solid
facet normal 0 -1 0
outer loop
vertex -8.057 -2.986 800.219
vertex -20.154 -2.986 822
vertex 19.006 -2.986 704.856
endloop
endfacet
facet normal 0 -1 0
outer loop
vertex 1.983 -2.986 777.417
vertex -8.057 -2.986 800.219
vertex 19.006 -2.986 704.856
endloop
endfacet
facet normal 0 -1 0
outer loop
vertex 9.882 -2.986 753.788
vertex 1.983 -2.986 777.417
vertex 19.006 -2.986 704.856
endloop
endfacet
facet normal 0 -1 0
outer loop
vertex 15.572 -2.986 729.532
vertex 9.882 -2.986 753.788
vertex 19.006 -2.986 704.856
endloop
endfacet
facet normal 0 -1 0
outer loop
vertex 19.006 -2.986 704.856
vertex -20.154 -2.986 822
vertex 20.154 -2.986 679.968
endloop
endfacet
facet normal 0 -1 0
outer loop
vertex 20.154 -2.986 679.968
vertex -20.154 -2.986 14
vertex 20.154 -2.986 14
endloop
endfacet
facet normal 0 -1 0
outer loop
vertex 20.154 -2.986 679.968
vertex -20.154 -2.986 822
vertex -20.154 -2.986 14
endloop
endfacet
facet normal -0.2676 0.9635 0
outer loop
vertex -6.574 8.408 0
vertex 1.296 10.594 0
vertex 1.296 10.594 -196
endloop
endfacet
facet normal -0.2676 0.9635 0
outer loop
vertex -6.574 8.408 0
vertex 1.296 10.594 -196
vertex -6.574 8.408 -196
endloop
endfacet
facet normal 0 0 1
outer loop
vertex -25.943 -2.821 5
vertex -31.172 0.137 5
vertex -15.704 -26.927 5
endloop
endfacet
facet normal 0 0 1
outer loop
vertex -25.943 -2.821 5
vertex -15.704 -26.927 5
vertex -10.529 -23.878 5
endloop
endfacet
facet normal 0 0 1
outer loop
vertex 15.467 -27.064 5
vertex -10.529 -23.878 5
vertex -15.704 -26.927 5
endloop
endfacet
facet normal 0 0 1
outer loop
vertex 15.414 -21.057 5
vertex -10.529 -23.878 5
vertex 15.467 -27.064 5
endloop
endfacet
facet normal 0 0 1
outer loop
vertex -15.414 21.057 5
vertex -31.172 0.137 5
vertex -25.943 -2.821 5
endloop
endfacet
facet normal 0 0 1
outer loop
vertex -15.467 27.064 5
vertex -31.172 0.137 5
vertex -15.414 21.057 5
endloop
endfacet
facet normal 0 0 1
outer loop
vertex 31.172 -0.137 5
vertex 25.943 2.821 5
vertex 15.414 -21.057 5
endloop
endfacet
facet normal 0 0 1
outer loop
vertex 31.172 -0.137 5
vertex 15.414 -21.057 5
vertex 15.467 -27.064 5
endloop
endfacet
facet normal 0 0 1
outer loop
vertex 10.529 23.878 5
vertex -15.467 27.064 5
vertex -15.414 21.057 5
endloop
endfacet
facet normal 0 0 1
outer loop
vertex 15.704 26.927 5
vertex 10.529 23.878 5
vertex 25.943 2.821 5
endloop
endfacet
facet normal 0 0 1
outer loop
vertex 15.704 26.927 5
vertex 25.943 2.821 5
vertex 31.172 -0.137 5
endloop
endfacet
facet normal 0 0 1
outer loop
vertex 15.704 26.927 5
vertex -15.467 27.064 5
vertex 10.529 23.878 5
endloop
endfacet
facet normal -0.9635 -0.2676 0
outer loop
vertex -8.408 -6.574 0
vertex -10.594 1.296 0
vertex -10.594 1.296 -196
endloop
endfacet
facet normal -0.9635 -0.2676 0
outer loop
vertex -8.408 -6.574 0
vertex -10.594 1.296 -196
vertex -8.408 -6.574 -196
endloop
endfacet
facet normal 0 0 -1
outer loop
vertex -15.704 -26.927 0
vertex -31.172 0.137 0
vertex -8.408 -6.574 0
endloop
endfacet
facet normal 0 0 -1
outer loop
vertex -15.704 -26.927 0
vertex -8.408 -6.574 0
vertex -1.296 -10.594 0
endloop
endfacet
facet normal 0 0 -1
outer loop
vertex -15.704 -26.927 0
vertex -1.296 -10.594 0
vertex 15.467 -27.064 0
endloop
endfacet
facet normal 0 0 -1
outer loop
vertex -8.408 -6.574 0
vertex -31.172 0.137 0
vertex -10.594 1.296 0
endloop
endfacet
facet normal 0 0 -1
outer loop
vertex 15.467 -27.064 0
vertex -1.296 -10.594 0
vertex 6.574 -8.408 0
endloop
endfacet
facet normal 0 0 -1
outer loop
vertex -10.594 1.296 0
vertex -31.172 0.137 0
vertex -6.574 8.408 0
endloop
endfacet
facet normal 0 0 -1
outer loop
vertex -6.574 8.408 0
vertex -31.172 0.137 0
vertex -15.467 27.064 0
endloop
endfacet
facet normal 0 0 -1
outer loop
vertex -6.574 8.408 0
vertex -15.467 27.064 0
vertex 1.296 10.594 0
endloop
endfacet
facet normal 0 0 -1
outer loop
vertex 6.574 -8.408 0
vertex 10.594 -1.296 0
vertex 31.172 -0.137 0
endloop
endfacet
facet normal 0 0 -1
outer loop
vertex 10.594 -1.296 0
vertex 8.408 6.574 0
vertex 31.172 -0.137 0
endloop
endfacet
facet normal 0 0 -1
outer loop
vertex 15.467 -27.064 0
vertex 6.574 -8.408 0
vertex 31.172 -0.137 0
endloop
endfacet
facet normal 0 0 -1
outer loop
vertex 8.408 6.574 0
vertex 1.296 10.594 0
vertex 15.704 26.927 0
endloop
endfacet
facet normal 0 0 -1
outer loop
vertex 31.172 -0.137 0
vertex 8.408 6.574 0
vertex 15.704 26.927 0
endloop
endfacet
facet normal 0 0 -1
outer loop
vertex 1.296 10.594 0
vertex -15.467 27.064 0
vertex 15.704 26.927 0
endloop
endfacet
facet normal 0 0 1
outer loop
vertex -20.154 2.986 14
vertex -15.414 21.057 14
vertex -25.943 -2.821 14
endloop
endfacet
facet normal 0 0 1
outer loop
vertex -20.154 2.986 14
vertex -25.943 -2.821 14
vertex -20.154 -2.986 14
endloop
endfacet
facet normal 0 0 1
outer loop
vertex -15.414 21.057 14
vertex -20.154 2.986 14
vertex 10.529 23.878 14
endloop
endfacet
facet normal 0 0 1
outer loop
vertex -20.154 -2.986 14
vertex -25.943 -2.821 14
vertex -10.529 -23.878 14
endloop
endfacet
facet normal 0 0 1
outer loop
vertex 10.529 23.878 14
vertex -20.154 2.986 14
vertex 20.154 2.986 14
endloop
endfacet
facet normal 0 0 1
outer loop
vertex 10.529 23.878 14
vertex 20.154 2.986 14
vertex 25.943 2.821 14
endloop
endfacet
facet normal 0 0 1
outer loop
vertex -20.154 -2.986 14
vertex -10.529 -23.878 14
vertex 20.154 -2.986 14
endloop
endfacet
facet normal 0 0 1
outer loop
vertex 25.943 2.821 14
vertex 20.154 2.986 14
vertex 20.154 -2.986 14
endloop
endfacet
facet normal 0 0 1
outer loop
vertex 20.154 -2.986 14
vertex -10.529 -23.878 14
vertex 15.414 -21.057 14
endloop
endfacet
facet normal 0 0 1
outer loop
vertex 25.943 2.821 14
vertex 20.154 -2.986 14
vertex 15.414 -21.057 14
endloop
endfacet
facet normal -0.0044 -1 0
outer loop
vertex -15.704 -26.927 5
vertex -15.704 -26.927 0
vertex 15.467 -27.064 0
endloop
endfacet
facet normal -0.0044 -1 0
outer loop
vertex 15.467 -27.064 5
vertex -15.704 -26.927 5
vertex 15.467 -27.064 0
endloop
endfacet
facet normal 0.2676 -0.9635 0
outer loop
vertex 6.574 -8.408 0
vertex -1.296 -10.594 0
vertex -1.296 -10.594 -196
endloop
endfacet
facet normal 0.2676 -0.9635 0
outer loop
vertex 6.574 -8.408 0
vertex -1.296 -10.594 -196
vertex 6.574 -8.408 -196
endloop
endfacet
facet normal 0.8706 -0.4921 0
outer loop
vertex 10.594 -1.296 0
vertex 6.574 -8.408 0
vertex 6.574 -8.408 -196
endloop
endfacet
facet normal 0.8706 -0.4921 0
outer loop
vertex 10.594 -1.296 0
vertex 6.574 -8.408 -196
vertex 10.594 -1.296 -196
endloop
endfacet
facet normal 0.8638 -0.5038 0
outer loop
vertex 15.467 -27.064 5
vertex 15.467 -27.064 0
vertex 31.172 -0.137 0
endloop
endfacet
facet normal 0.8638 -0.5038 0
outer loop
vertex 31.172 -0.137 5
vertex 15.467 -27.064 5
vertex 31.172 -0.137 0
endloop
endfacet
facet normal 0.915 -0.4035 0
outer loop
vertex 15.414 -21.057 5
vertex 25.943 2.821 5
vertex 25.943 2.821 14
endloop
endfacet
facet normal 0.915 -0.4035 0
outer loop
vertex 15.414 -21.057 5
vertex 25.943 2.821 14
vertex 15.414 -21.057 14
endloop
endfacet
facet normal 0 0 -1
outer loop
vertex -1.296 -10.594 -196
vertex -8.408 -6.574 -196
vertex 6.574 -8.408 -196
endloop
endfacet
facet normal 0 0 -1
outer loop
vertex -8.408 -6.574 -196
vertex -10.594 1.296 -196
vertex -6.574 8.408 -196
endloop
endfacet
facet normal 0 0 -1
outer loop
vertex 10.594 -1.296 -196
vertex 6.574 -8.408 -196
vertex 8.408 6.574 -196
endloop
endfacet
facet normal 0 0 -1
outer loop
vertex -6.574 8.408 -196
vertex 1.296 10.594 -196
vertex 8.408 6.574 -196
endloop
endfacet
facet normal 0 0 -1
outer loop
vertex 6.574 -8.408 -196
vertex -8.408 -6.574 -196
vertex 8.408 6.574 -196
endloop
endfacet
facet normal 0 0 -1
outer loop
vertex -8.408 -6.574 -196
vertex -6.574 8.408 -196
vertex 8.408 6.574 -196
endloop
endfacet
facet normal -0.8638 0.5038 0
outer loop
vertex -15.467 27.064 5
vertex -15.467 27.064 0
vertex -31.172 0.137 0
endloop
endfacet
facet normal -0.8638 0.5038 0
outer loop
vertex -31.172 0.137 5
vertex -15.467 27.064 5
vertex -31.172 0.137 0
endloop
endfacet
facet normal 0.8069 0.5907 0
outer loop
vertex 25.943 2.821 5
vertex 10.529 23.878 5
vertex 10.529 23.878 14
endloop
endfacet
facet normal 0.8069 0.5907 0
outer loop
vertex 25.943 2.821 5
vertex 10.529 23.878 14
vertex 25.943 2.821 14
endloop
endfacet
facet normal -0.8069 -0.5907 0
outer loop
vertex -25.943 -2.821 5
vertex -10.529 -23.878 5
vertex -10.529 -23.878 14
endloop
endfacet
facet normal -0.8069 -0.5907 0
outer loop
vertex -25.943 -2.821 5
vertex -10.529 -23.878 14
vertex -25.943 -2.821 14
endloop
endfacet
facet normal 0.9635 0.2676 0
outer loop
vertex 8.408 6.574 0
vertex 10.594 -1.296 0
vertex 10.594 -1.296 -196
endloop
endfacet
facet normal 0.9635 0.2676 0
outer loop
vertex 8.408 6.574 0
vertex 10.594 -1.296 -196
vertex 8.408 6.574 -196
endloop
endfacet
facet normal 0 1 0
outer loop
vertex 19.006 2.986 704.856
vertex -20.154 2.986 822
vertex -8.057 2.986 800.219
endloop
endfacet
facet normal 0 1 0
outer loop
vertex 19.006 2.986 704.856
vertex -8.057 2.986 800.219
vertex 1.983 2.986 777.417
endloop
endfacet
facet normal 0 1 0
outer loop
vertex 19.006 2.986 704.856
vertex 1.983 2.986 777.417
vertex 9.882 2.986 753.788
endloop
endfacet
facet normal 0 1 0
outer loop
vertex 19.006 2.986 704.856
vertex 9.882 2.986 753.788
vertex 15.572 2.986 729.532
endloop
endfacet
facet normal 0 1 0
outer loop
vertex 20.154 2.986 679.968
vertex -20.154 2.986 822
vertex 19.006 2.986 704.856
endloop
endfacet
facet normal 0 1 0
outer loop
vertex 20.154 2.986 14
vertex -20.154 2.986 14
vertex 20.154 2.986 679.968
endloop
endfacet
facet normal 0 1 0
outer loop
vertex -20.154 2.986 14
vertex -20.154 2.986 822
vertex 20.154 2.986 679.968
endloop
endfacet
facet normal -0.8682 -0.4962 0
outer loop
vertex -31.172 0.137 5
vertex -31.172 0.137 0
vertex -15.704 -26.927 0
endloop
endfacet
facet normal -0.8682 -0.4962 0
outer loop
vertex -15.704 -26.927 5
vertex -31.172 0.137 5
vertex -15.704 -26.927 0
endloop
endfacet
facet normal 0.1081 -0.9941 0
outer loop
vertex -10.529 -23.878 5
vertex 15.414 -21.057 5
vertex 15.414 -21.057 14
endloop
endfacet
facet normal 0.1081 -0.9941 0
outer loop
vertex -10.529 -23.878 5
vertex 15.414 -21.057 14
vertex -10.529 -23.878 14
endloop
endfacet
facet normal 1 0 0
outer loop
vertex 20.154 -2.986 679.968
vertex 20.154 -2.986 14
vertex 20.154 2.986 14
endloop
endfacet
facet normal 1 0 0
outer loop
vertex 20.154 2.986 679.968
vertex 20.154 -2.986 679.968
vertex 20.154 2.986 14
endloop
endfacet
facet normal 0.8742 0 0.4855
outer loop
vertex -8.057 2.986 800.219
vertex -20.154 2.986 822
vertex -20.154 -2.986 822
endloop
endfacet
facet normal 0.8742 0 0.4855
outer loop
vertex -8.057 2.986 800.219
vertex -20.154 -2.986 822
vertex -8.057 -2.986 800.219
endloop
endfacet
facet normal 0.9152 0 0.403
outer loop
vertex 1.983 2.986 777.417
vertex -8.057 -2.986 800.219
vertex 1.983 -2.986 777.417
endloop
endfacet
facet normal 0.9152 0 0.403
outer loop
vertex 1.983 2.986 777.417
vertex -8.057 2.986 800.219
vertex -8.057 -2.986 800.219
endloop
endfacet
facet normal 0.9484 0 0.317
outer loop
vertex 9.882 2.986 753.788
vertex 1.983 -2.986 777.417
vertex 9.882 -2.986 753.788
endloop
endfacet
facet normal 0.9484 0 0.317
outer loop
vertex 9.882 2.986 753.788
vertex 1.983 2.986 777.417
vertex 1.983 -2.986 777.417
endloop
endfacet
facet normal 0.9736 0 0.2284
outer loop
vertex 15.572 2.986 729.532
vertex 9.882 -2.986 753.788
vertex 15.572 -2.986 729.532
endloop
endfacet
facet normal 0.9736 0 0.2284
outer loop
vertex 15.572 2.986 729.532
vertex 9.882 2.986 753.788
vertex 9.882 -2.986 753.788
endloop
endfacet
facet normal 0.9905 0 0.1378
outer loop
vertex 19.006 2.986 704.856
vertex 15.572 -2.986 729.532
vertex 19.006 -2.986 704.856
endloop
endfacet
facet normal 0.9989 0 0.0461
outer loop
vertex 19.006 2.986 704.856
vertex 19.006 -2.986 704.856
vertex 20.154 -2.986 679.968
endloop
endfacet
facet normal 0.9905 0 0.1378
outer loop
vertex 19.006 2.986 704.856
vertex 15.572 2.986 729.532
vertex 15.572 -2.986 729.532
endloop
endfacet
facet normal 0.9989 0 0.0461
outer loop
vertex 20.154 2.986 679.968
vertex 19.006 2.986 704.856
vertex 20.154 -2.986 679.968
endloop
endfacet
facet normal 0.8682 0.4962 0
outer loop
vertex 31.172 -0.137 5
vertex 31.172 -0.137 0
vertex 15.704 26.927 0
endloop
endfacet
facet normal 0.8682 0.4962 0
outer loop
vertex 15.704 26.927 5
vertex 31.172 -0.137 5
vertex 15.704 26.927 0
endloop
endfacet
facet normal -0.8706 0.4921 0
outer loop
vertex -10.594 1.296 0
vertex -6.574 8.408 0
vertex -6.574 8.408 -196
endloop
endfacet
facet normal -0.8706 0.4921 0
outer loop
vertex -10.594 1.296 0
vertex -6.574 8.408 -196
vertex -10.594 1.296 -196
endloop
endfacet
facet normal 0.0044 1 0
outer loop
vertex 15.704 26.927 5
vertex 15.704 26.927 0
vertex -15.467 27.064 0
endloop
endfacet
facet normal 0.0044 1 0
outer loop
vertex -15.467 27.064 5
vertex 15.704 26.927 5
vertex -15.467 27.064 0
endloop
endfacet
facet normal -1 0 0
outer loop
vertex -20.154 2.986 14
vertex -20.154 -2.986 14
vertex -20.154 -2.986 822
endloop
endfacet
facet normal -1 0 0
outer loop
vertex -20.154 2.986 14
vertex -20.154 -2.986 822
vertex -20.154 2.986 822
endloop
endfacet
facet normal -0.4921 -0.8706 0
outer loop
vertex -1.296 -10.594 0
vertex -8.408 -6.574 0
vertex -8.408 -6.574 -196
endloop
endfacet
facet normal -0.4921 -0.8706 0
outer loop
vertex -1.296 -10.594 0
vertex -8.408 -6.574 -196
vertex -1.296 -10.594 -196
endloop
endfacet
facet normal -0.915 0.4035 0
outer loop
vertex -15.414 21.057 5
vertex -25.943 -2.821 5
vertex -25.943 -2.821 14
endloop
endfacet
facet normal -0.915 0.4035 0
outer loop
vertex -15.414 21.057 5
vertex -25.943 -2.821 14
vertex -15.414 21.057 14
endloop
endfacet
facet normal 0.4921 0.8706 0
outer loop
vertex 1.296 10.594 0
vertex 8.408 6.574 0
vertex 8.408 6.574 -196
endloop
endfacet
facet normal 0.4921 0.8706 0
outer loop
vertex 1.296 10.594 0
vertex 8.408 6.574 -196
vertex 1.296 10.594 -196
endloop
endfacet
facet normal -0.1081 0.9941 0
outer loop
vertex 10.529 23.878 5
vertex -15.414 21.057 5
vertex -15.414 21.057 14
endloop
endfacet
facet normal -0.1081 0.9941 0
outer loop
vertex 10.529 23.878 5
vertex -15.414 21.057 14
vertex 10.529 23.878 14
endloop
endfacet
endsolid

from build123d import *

# Parameters (mm, degrees)
F0_W        = 40.3080582619
F0_H        = 5.9715644456
F1_DEPTH    = 822
F3_DEPTH    = 196
F5_DEPTH    = 5
F6_T1_DEPTH = 716.1336390313
F8_DEPTH    = 14


# Not quite as in the source:
# - a fillet or chamfer that OpenCascade refuses, or shapes differently, is made with other operations: its cross-section is extruded or revolved along the edge and cut away or added


with BuildPart() as f1:
    # F0 (on Top) → F1 (new body)
    with BuildSketch(Plane.XY):
        Rectangle(F0_W, F0_H)
    extrude(amount=F1_DEPTH)

    # F2 (on Top) → F3 (join)
    with BuildSketch(Plane.XY):
        Polygon((6.5744029718, -8.407556447), (10.5938451005, -1.2962352533), (8.407556447, 6.5744029718), (1.2962352533, 10.5938451005), (-6.5744029718, 8.407556447), (-10.5938451005, 1.2962352533), (-8.407556447, -6.5744029718), (-1.2962352533, -10.5938451005), align=None)
    extrude(amount=-F3_DEPTH)

    # F4 (on Top) → F5 (join)
    with BuildSketch(Plane.XY):
        Polygon((31.1715127681, -0.1368859226), (15.7043030704, 26.9268789703), (-15.4672096977, 27.0637648929), (-31.1715127681, 0.1368859226), (-15.7043030704, -26.9268789703), (15.4672096977, -27.0637648929), align=None)
    extrude(amount=F5_DEPTH)

    # F6: fillet of radius 270.3919189858 on 1 edges, made by hand

    # F6_s2 → F6_t1 (cut)
    with BuildSketch(Plane.XZ.offset(-358.0668195157)):
        with BuildLine():
            ThreePointArc((-20.1540291309, 822), (9.881896476, 753.7882231999), (20.1540291309, 679.9675850829))
            Line((20.1540291309, 679.9675850829), (20.1540291309, 822))
            Line((20.1540291309, 822), (-20.1540291309, 822))
        make_face()
    extrude(amount=F6_T1_DEPTH, mode=Mode.SUBTRACT)

    # F7 (on face) → F8 (join)
    with BuildSketch(Plane(origin=(0, 0, 0), x_dir=(1, 0, 0), z_dir=(0, 0, -1))):
        Polygon((-10.5287277243, 23.8778866657), (-25.9432203033, 2.8207976541), (-15.4144925791, -21.0570890116), (10.5287277243, -23.8778866657), (25.9432203033, -2.8207976541), (15.4144925791, 21.0570890116), align=None)
    extrude(amount=-F8_DEPTH)


solid = f1.part
